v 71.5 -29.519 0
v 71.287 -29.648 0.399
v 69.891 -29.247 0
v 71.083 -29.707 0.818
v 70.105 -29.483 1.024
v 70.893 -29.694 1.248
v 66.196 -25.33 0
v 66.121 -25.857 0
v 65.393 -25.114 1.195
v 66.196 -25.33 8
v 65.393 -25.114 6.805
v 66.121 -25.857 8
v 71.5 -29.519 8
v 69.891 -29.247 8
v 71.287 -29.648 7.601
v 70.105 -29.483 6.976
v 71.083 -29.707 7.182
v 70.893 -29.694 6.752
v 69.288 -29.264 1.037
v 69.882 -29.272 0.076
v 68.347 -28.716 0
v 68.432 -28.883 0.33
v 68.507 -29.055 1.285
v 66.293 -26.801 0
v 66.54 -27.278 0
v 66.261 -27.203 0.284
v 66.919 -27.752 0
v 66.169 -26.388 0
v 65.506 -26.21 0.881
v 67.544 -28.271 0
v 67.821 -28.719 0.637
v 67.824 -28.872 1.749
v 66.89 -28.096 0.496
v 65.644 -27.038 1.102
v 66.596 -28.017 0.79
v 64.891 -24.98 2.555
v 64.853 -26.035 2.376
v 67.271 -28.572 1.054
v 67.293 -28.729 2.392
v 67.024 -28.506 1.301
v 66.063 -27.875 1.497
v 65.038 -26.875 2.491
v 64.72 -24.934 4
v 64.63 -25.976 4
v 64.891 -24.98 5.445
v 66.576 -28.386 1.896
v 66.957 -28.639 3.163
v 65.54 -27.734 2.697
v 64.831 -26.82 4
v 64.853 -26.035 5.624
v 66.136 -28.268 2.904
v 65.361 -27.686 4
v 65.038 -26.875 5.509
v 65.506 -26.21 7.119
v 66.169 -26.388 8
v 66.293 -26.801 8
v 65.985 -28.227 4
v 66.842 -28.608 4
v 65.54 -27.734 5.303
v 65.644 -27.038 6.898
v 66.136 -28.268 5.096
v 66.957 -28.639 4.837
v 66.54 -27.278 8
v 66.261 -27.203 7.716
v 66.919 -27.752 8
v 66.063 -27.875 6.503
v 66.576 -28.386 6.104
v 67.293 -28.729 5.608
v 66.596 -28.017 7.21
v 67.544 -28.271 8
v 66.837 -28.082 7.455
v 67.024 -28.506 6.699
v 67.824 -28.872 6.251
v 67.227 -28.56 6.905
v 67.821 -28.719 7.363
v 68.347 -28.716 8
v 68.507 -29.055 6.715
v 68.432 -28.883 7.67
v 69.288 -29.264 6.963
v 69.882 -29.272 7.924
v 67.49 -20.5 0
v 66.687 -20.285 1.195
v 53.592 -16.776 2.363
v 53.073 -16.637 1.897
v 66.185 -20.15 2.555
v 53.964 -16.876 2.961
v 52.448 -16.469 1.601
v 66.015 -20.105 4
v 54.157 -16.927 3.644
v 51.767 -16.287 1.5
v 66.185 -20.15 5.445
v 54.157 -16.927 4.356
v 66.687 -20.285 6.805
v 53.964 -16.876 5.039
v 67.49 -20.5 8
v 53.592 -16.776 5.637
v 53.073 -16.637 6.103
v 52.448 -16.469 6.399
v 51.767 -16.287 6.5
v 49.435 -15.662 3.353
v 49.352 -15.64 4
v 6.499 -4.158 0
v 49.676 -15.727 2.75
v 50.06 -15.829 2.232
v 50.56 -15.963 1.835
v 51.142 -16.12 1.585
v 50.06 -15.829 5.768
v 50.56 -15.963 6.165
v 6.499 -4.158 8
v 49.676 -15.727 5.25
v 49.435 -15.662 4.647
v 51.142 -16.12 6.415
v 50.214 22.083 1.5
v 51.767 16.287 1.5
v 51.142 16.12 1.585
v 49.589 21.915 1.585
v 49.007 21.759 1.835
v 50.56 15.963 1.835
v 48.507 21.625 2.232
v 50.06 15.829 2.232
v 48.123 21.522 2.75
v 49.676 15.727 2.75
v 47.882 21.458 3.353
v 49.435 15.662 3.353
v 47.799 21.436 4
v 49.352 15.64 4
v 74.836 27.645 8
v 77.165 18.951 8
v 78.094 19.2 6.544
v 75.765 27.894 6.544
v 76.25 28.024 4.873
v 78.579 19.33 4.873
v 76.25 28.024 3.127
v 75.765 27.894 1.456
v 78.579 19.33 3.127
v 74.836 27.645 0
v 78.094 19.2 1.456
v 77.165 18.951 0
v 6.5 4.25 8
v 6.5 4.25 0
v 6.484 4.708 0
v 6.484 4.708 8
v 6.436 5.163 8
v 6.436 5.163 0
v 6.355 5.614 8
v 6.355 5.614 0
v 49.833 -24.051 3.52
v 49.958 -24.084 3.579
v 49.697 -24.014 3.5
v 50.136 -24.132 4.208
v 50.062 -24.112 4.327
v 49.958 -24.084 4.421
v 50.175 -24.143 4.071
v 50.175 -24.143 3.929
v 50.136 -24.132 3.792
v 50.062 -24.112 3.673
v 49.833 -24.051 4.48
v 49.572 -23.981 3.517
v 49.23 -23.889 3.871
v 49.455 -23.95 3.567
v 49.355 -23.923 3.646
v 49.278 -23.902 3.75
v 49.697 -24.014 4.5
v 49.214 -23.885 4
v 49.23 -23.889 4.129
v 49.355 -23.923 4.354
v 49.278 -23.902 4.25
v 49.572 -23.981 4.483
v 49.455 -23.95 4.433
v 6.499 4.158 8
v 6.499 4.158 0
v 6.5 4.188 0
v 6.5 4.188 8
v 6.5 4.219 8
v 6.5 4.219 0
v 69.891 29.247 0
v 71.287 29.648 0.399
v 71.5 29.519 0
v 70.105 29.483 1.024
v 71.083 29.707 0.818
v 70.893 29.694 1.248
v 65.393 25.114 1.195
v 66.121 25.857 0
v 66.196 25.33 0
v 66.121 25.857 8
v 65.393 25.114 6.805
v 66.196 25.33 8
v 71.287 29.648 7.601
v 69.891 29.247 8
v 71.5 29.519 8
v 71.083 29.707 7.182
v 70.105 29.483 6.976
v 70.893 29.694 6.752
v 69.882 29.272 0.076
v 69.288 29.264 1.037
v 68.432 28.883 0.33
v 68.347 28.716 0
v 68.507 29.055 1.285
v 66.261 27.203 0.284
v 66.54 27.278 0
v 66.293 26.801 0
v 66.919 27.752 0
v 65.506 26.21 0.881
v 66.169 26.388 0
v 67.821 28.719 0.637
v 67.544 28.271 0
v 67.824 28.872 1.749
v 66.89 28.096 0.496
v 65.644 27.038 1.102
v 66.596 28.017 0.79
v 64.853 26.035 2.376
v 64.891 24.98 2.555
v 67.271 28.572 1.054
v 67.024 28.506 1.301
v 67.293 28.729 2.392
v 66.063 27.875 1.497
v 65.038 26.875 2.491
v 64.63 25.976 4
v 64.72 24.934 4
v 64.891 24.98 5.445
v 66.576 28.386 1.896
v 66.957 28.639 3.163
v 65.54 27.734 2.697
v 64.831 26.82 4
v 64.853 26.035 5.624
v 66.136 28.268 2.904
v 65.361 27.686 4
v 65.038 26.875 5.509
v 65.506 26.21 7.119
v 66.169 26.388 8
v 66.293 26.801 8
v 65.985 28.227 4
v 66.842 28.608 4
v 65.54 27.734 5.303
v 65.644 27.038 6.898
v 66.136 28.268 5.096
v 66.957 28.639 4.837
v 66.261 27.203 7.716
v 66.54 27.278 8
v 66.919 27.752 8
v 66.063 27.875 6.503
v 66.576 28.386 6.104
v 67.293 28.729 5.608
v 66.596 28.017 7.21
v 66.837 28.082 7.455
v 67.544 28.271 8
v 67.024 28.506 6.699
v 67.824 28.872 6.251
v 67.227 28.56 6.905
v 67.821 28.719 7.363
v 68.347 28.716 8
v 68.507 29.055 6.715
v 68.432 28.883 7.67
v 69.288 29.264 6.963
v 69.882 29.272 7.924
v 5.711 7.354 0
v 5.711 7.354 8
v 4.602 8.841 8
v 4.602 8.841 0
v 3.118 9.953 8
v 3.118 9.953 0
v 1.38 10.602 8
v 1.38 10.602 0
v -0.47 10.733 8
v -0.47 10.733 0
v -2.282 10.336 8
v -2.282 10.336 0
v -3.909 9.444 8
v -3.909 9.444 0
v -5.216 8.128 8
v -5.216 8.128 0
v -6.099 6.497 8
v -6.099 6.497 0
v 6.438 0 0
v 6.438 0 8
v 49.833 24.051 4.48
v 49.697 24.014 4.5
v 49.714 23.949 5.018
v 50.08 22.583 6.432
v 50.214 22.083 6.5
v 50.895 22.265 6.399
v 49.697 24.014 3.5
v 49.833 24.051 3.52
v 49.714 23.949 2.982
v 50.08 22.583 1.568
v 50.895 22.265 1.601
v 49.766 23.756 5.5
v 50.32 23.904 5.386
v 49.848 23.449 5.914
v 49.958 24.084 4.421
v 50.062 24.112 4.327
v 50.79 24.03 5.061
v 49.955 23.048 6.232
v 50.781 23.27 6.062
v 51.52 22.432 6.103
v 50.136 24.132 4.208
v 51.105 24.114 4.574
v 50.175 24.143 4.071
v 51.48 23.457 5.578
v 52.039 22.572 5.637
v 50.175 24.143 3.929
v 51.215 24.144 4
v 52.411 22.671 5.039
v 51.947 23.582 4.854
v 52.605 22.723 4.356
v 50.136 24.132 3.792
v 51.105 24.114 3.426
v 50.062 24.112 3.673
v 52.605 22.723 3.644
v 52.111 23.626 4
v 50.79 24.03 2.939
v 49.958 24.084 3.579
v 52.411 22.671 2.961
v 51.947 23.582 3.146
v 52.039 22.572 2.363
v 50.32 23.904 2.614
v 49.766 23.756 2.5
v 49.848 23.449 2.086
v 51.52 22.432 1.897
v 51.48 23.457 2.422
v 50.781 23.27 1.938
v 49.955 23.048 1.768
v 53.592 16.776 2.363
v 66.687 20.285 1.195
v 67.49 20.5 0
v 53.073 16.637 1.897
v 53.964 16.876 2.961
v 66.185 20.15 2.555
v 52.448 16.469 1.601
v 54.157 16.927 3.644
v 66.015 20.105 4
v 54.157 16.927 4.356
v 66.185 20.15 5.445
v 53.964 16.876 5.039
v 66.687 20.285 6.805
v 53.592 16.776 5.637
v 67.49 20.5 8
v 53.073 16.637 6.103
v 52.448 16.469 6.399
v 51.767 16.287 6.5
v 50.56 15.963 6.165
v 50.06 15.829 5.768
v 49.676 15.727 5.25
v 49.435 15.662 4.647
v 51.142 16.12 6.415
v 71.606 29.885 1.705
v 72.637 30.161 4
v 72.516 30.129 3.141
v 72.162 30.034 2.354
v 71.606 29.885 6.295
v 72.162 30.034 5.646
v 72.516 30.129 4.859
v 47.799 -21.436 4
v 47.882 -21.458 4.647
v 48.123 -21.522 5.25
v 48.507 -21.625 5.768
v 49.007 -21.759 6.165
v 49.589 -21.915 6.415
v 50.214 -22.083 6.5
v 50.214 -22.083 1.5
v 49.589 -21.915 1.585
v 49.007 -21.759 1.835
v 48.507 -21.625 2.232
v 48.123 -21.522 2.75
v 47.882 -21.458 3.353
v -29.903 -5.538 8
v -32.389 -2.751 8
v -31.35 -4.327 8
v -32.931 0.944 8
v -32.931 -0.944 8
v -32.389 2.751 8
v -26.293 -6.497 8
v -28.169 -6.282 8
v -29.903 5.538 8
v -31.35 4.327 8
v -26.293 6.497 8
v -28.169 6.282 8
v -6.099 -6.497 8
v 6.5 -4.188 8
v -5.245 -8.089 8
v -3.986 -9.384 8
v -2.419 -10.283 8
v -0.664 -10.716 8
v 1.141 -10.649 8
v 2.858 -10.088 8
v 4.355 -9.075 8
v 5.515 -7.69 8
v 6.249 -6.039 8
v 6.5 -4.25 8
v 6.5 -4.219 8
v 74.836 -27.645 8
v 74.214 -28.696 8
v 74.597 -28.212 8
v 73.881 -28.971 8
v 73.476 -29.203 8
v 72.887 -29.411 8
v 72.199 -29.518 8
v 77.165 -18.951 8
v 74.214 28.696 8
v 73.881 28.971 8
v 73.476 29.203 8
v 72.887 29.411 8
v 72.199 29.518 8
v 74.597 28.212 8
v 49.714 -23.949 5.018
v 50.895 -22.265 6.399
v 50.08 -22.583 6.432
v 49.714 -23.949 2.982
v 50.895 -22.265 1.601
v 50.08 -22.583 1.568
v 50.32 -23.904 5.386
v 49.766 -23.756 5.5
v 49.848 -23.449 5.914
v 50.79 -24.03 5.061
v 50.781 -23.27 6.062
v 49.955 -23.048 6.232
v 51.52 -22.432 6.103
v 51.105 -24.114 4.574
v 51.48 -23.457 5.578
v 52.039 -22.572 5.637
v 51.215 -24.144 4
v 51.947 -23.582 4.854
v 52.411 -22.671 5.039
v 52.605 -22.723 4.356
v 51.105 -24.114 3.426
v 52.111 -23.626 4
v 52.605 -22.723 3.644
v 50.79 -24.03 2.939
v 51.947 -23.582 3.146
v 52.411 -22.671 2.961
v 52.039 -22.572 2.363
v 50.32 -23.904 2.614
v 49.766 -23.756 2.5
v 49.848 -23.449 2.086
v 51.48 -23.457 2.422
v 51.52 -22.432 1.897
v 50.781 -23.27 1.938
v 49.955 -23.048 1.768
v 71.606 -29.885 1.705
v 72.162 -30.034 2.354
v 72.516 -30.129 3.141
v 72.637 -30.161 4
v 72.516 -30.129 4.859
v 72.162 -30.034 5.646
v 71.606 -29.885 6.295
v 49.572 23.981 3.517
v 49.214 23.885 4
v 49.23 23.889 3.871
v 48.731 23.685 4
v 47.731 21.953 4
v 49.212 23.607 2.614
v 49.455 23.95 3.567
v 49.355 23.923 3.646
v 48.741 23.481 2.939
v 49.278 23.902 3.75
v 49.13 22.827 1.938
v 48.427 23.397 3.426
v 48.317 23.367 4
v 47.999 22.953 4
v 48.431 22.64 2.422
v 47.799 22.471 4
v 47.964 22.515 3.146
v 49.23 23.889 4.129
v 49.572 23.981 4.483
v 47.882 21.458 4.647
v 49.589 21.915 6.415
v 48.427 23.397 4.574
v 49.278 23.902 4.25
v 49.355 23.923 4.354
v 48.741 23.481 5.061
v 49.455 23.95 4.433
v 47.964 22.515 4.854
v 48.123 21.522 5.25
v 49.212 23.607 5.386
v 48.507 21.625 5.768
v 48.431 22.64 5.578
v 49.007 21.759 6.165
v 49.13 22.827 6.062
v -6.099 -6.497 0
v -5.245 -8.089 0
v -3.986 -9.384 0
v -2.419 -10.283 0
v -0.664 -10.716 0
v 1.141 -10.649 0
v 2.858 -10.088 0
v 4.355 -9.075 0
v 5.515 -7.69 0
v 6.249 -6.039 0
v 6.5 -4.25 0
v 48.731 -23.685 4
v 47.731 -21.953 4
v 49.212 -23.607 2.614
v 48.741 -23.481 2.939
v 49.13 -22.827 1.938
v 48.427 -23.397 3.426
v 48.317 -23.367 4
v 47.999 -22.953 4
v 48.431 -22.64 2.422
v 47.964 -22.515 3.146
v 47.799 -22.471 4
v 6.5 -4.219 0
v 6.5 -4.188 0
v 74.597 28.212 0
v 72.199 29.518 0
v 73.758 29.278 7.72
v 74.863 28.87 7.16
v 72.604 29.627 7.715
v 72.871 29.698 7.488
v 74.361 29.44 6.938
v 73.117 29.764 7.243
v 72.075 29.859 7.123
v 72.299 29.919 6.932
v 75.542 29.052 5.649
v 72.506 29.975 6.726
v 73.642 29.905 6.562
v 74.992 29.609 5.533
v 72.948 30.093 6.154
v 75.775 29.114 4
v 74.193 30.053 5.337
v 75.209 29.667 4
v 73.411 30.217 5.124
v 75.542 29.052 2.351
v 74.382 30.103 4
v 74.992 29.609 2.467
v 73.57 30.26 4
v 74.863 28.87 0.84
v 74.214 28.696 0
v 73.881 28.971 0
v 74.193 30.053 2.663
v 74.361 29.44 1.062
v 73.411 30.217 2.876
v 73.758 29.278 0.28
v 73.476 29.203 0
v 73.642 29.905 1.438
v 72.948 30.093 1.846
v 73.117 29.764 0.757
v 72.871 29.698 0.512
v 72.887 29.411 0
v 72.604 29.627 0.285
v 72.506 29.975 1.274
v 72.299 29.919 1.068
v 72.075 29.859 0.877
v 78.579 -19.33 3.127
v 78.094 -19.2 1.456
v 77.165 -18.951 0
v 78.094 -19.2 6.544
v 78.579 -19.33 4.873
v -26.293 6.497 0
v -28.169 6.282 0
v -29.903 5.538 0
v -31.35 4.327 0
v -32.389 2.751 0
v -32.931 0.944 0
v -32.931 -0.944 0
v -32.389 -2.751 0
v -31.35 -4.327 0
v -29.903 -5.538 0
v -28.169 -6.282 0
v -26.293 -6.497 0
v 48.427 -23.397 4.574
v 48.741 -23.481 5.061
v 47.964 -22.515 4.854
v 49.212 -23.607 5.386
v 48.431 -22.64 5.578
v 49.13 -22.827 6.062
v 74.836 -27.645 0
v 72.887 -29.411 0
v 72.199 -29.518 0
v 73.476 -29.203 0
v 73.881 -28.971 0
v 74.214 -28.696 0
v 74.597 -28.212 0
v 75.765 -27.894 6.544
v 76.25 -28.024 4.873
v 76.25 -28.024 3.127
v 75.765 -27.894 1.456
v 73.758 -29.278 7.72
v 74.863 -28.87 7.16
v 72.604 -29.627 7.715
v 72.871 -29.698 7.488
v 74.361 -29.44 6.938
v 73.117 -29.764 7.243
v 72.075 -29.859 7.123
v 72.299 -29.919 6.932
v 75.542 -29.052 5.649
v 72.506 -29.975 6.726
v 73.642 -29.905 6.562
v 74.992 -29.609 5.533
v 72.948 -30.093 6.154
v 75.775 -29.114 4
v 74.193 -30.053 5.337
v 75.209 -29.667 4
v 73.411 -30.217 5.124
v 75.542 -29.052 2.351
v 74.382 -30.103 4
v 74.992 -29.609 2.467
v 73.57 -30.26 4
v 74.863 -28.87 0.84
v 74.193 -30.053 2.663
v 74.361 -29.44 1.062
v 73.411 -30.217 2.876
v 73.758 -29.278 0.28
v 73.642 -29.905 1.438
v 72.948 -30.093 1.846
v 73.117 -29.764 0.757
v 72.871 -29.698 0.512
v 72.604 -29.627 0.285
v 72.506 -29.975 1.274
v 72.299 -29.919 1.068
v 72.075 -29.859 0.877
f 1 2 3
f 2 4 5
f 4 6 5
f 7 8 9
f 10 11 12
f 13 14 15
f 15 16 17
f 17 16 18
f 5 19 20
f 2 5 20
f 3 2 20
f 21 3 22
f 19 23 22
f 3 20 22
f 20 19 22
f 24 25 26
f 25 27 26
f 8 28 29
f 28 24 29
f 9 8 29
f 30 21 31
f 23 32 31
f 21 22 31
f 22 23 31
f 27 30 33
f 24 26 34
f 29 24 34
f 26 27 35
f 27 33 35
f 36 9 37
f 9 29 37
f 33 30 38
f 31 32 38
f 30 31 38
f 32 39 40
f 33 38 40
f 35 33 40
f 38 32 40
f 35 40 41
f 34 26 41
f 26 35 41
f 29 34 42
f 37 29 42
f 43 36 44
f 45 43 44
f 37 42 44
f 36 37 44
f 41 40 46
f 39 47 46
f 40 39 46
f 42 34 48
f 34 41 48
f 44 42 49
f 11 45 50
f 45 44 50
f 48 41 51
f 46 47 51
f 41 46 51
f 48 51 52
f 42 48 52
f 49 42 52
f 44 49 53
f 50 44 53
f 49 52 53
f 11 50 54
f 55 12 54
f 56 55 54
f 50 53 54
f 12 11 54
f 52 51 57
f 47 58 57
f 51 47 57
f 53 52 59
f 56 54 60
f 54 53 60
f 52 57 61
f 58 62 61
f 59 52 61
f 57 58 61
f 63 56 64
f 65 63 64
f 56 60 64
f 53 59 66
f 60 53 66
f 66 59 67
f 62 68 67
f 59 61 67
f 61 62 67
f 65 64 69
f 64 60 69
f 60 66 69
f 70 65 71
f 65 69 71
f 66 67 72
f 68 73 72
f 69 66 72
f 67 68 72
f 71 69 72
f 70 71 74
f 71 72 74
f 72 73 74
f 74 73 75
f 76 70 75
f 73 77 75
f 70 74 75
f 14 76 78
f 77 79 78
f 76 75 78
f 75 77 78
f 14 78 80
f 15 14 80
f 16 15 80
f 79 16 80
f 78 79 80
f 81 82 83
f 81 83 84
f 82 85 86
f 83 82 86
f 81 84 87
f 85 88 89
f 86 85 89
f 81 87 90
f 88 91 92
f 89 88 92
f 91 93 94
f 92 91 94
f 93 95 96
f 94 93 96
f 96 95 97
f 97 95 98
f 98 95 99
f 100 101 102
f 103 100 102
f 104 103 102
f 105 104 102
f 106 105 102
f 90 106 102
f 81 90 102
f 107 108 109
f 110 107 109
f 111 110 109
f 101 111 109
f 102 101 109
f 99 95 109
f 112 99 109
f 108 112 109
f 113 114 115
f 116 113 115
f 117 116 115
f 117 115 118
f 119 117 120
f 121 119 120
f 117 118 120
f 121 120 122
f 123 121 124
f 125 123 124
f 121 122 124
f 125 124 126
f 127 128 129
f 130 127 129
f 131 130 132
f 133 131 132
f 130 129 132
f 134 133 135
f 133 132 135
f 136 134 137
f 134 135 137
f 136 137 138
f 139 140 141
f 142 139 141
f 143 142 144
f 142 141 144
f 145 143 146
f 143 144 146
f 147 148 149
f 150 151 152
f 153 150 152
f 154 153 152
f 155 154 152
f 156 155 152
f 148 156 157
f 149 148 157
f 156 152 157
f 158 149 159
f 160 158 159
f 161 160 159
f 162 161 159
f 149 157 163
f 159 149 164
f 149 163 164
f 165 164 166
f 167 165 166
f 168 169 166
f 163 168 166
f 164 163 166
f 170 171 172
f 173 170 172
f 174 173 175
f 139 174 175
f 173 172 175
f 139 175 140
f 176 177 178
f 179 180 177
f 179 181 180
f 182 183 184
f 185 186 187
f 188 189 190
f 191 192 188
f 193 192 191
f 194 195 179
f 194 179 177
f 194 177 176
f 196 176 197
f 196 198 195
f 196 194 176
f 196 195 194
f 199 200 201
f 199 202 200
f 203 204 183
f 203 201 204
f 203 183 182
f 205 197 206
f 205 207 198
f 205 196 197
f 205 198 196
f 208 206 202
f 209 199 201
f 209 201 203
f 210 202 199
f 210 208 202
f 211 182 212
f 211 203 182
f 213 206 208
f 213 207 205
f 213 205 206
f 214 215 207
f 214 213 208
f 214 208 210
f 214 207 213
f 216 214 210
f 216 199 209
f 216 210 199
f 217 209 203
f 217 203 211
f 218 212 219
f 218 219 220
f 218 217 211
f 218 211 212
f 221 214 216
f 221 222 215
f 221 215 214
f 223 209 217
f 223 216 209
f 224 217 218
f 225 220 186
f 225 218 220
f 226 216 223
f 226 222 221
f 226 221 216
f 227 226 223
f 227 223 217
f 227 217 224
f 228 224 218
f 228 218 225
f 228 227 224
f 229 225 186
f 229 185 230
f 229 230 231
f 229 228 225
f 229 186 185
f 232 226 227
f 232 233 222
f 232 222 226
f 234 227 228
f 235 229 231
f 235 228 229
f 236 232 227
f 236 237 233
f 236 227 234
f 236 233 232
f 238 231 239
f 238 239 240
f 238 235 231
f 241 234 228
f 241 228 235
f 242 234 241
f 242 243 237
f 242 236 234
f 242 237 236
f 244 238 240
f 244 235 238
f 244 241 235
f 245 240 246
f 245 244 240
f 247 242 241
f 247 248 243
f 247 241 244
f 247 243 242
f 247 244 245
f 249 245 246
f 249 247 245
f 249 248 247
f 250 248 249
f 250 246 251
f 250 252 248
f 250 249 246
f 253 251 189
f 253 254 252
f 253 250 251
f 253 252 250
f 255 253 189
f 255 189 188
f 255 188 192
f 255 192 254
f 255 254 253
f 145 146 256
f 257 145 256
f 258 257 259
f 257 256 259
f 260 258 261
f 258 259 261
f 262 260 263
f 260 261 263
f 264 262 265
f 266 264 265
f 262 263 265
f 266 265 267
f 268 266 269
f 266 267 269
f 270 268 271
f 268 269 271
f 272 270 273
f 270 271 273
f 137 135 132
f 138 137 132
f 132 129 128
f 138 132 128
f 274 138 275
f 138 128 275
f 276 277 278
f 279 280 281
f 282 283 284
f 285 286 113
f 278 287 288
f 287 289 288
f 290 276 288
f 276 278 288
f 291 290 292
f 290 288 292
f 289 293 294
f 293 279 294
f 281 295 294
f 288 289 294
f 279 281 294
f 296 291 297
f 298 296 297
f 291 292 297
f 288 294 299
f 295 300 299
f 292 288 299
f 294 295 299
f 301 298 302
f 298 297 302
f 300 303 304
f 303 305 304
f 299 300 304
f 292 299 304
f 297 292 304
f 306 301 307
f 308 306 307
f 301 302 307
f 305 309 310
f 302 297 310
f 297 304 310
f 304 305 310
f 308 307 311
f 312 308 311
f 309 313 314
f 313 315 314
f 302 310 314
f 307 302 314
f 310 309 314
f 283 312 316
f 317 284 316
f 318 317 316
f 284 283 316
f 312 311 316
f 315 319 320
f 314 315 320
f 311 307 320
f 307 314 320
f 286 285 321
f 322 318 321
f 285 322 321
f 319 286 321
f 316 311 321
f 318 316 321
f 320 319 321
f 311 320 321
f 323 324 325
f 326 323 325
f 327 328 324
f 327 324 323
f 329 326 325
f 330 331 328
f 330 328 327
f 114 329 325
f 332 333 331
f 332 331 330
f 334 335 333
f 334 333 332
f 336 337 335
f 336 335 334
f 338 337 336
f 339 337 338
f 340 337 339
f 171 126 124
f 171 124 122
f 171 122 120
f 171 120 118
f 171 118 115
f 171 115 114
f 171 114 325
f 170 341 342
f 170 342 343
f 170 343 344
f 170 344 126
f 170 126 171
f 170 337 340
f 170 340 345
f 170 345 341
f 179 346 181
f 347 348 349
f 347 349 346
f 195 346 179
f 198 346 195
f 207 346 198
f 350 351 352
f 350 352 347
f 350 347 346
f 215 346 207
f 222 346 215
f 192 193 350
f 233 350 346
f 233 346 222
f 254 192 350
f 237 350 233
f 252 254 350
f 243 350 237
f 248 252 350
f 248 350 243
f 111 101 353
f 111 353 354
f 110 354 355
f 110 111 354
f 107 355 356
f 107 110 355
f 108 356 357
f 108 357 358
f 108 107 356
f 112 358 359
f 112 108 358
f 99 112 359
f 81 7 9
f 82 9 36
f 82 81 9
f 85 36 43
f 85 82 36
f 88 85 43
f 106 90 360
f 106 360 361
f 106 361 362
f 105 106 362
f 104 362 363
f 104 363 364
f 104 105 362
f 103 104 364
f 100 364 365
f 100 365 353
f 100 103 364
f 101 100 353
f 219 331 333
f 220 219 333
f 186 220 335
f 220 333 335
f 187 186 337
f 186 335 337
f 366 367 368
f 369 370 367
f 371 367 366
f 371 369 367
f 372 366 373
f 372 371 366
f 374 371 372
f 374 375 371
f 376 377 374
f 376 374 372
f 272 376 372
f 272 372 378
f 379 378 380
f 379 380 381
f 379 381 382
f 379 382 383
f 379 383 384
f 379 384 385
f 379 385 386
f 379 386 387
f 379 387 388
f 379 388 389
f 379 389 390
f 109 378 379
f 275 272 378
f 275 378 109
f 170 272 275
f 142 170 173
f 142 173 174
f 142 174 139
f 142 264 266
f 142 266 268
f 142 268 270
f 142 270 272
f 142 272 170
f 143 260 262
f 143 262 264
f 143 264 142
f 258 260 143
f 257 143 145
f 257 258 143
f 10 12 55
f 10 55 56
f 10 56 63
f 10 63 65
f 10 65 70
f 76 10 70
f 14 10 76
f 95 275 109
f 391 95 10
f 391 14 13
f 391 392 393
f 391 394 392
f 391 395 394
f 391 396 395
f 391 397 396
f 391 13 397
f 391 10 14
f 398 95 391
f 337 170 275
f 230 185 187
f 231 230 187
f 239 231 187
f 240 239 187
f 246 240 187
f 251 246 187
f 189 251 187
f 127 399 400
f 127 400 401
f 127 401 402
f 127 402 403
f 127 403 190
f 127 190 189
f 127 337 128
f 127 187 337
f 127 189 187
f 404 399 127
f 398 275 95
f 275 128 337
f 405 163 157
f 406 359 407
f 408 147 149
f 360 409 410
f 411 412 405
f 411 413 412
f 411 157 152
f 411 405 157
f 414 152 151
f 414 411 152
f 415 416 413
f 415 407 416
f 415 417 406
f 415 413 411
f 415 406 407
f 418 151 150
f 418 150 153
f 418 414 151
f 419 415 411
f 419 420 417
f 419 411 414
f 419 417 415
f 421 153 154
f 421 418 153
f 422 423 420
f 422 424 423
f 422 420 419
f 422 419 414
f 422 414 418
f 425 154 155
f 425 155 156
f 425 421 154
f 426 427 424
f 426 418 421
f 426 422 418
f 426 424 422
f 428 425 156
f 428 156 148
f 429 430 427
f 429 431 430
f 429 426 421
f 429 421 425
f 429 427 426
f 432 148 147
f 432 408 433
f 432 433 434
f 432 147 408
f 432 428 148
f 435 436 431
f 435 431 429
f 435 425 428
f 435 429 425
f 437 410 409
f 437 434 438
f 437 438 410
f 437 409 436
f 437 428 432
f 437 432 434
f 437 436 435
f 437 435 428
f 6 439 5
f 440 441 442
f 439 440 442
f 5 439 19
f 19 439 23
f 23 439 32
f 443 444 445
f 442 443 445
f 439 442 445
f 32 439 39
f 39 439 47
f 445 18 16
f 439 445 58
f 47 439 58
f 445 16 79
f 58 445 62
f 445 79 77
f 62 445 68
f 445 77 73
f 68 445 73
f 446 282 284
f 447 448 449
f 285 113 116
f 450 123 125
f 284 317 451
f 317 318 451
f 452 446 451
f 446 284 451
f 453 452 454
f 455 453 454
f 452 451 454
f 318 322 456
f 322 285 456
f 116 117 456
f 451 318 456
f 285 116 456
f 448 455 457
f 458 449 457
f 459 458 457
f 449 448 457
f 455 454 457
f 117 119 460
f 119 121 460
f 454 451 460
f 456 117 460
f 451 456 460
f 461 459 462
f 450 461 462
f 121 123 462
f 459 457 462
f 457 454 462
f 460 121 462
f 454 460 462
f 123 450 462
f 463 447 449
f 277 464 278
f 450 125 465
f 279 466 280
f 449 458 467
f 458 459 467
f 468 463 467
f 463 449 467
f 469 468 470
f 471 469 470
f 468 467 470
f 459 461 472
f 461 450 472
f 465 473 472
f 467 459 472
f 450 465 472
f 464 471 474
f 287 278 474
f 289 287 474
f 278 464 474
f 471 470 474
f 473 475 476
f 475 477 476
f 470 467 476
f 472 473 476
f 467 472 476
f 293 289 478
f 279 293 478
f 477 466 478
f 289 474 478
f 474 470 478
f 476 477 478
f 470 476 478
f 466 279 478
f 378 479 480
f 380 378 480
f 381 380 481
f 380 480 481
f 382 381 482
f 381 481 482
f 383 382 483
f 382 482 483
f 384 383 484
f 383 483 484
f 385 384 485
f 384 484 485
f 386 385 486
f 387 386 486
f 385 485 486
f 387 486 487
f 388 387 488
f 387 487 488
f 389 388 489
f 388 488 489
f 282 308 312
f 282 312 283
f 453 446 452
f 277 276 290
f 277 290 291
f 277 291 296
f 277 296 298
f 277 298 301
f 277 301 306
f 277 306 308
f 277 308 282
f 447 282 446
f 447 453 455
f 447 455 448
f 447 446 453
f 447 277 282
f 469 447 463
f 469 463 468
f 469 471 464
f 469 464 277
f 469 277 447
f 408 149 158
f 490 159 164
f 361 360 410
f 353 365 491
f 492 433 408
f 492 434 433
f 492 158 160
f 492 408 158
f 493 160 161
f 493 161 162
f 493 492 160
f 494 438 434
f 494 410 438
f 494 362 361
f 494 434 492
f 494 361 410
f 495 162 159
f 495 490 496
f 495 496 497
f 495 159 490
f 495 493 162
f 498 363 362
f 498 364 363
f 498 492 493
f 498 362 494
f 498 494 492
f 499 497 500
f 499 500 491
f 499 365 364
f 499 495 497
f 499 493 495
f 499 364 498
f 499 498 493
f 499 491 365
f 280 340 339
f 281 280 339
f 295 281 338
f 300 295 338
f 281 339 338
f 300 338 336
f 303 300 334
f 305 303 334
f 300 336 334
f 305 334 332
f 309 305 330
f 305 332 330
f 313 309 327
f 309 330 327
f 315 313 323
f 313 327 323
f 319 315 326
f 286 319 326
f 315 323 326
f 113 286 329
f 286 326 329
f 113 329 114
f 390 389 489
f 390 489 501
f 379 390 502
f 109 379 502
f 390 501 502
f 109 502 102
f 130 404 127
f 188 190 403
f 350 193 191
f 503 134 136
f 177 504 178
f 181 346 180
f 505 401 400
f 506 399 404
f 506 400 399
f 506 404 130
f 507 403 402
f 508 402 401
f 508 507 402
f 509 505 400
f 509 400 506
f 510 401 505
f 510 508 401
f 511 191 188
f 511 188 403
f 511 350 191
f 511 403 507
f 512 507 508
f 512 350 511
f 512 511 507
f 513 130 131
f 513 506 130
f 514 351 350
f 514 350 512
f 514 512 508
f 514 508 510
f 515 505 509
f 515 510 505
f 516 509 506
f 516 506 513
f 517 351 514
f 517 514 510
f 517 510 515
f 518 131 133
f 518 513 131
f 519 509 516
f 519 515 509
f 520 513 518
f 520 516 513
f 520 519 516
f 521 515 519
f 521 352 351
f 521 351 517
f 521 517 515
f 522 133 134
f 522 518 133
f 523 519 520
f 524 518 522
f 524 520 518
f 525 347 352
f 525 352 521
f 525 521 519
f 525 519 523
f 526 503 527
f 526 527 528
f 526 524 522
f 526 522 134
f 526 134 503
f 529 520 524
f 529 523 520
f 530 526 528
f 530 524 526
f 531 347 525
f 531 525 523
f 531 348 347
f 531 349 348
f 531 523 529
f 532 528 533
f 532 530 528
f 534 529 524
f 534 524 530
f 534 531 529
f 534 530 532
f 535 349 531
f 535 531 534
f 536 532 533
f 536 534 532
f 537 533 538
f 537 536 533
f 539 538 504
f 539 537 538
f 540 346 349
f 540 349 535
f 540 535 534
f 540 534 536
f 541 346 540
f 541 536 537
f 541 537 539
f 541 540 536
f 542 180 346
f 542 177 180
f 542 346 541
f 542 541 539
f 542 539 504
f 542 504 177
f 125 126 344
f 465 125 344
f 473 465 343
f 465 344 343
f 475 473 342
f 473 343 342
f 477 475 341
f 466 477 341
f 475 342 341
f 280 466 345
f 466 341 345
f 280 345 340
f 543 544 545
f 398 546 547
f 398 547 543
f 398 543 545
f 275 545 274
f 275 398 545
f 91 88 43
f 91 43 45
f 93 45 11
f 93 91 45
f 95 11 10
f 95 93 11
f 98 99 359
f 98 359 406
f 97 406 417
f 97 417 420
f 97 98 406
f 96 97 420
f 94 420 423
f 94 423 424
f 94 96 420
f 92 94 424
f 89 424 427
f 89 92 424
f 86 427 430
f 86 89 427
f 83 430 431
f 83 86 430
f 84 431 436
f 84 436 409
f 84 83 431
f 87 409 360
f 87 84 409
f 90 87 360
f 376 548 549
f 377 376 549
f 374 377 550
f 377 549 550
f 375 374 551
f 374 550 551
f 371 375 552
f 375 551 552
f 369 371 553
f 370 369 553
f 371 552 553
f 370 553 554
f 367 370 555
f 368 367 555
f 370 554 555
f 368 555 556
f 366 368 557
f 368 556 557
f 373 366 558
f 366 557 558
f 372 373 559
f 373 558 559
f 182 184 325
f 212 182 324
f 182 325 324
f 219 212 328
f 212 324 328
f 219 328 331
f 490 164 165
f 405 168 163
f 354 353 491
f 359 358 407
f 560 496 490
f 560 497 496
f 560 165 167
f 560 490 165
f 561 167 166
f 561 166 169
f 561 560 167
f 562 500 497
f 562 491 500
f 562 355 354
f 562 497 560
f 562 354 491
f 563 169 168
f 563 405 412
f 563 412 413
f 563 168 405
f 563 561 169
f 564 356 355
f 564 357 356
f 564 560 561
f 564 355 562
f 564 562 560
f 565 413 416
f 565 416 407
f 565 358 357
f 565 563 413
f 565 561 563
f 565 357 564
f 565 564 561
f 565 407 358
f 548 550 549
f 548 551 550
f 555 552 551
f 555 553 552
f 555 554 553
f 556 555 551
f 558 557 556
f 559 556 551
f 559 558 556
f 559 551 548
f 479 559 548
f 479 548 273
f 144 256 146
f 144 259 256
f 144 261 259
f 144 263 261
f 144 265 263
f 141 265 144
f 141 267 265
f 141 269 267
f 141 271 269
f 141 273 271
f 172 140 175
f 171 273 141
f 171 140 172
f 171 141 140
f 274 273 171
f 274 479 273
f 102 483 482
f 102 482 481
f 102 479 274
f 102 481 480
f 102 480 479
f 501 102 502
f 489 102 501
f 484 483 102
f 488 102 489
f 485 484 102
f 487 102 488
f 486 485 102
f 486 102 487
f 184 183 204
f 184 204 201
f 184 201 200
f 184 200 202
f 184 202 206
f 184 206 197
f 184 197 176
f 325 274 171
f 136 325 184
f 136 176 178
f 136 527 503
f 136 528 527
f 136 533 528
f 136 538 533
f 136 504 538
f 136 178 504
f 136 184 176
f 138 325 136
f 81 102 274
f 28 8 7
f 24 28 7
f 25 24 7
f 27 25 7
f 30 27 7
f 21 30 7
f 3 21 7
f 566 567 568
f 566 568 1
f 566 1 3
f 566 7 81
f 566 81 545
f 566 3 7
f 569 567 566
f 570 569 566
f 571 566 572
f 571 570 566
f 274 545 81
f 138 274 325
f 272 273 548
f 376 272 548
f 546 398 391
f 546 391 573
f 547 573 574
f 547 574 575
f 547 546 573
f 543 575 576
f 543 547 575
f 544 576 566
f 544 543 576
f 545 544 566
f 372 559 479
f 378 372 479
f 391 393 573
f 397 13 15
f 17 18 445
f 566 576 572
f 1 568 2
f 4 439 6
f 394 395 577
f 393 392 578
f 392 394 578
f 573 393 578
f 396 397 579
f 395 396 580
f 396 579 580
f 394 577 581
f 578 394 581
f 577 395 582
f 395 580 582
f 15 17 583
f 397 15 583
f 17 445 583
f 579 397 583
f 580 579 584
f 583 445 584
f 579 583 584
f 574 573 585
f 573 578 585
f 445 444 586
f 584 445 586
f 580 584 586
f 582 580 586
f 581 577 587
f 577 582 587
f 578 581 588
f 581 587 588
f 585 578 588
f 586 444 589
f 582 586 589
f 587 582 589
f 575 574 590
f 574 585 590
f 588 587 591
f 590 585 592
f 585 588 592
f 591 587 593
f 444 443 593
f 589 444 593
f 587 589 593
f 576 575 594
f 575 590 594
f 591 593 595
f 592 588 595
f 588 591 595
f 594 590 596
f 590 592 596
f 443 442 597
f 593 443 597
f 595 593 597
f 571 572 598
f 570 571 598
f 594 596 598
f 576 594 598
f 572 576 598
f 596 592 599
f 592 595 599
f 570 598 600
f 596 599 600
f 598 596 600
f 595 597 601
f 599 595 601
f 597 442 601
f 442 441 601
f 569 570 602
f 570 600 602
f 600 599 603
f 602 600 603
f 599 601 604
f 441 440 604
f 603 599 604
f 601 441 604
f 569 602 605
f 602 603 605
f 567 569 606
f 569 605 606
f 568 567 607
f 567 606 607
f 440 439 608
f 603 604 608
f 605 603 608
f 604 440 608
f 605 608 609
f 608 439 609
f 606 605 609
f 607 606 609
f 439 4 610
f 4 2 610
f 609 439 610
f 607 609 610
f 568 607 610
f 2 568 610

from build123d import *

# Parameters (mm, degrees)
F1_DEPTH    = 8
F4_DEPTH    = 12
F5_DEPTH    = 12
F6_DEPTH    = 4
F7_T2_ANGLE = 226.9097490639
F7_T4_ANGLE = 226.9097490639
F8_R        = 2


# Not quite as in the source:
# - a fillet or chamfer that OpenCascade refuses, or shapes differently, is made with other operations: its cross-section is extruded or revolved along the edge and cut away or added
# - a feature names something its author has since deleted; it is built from what else it names


with BuildPart() as f1:
    # F0 (on Top) → F1 (new body)
    with BuildSketch(Plane.XY):
        with BuildLine():
            ThreePointArc((-26.2934756426, -6.4967182246), (-21.8313594954, -4.5225872947), (-20, 0))
            ThreePointArc((-20, 0), (-21.8313594954, 4.5225872947), (-26.2934756426, 6.4967182246))
            ThreePointArc((-26.2934756426, 6.4967182246), (-33, 0), (-26.2934756426, -6.4967182246))
        make_face()
        with BuildLine():
            ThreePointArc((4.9180788932, 0), (0, 2.25), (-4.9180788932, 0))
            ThreePointArc((-4.9180788932, 0), (0, -2.25), (4.9180788932, 0))
        make_face()
        with BuildLine():
            Line((6.4380174247, 0), (6.3926786471, 3.0737093407))
            ThreePointArc((6.3926786471, 3.0737093407), (5.8604804677, 1.4384579519), (4.9180788932, 0))
            ThreePointArc((4.9180788932, 0), (6.0748085227, -1.9377064606), (6.4992929884, -4.1541321195))
            Line((6.4992929884, -4.1541321195), (6.4380174247, 0))
        make_face()
        with BuildLine():
            ThreePointArc((-26.2934756426, 6.4967182246), (-21.8313594954, 4.5225872947), (-20, 0))
            ThreePointArc((-20, 0), (-21.8313594954, -4.5225872947), (-26.2934756426, -6.4967182246))
            Line((-26.2934756426, -6.4967182246), (-6.0993653128, -6.4967182246))
            ThreePointArc((-6.0993653128, -6.4967182246), (-6.3951431673, -3.0871827877), (-4.9180788932, 0))
            ThreePointArc((-4.9180788932, 0), (-6.3951431673, 3.0871827877), (-6.0993653128, 6.4967182246))
            Line((-6.0993653128, 6.4967182246), (-26.2934756426, 6.4967182246))
        make_face()
        with BuildLine():
            ThreePointArc((-4.9180788932, 0), (-6.3951431673, -3.0871827877), (-6.0993653128, -6.4967182246))
            ThreePointArc((-6.0993653128, -6.4967182246), (1.141079635, -10.6490575296), (6.5, -4.25))
            ThreePointArc((6.5, -4.25), (6.4998232447, -4.2020647563), (6.4992929884, -4.1541321195))
            ThreePointArc((6.4992929884, -4.1541321195), (6.0748085227, -1.9377064606), (4.9180788932, 0))
            ThreePointArc((4.9180788932, 0), (0, -2.25), (-4.9180788932, 0))
        make_face()
        with BuildLine():
            ThreePointArc((6.3552032224, 5.614328407), (0.4593650036, 10.7337476658), (-6.0993653128, 6.4967182246))
            ThreePointArc((-6.0993653128, 6.4967182246), (-6.3951431673, 3.0871827877), (-4.9180788932, 0))
            ThreePointArc((-4.9180788932, 0), (0, 2.25), (4.9180788932, 0))
            ThreePointArc((4.9180788932, 0), (5.8604804677, 1.4384579519), (6.3926786471, 3.0737093407))
            Line((6.3926786471, 3.0737093407), (6.3552032224, 5.614328407))
        make_face()
        with BuildLine():
            ThreePointArc((6.5, 4.25), (6.4636994417, 4.9359952822), (6.3552032224, 5.614328407))
            Line((6.3552032224, 5.614328407), (6.3926786471, 3.0737093407))
            ThreePointArc((6.3926786471, 3.0737093407), (6.4731140576, 3.6594118212), (6.5, 4.25))
        make_face()
    extrude(amount=F1_DEPTH)



with BuildPart() as f4:
    # F3 (on line) → F4 (new body)
    with BuildSketch(Plane(origin=(0.4312653925, -1.6095043562, 0), x_dir=(-0.9659258263, -0.2588190451, 0), z_dir=(-0.2588190451, 0.9659258263, 0))):
        with BuildLine():
            Line((-79.4407832557, 0), (-74.9686473007, 0))
            Line((-74.9686473007, 0), (-74.9686473007, 8))
            Line((-74.9686473007, 8), (-79.4407832557, 8))
            ThreePointArc((-79.4407832557, 8), (-80.9686473007, 4), (-79.4407832557, 0))
        make_face()
        with BuildLine():
            Line((-74.9686473007, 8), (-74.9686473007, 0))
            Line((-74.9686473007, 0), (-70.4965113457, 0))
            ThreePointArc((-70.4965113457, 0), (-69.3636131469, 1.8590674614), (-68.9686473007, 4))
            ThreePointArc((-68.9686473007, 4), (-69.3636131469, 6.1409325386), (-70.4965113457, 8))
            Line((-70.4965113457, 8), (-74.9686473007, 8))
        make_face()
    extrude(amount=F4_DEPTH)


with BuildPart() as f5:
    # F3 (on line) → F5 (new body)
    with BuildSketch(Plane(origin=(0.4312653925, -1.6095043562, 0), x_dir=(-0.9659258263, -0.2588190451, 0), z_dir=(-0.2588190451, 0.9659258263, 0))):
        with BuildLine():
            ThreePointArc((-54.2186473007, 6.5), (-56.7186473007, 4), (-54.2186473007, 1.5))
            Line((-54.2186473007, 1.5), (-54.2186473007, 4))
            Line((-54.2186473007, 4), (-54.2186473007, 6.5))
        make_face()
        with BuildLine():
            ThreePointArc((-51.7186473007, 4), (-52.4508803477, 5.767766953), (-54.2186473007, 6.5))
            Line((-54.2186473007, 6.5), (-54.2186473007, 4))
            Line((-54.2186473007, 4), (-51.7186473007, 4))
        make_face()
        with BuildLine():
            Line((-54.2186473007, 4), (-54.2186473007, 1.5))
            ThreePointArc((-54.2186473007, 1.5), (-52.4508803477, 2.232233047), (-51.7186473007, 4))
            Line((-51.7186473007, 4), (-54.2186473007, 4))
        make_face()
    extrude(amount=F5_DEPTH)


with BuildPart() as f1_1:
    add(f1.part)

    add(f4.part)  # F6 merges F4

    add(f5.part)  # F6 merges F5
    # F3 (on line) → F6 (join)
    with BuildSketch(Plane(origin=(0.4312653925, -1.6095043562, 0), x_dir=(-0.9659258263, -0.2588190451, 0), z_dir=(-0.2588190451, 0.9659258263, 0))):
        with BuildLine():
            Line((-54.2186473007, 1.5), (-54.2186473007, 0))
            Line((-54.2186473007, 0), (-6.2186473007, 0))
            Line((-6.2186473007, 0), (-6.2186473007, 4))
            Line((-6.2186473007, 4), (-51.7186473007, 4))
            ThreePointArc((-51.7186473007, 4), (-52.4508803477, 2.232233047), (-54.2186473007, 1.5))
        make_face()
        with BuildLine():
            Line((-6.2186473007, 8), (-54.2186473007, 8))
            Line((-54.2186473007, 8), (-54.2186473007, 6.5))
            ThreePointArc((-54.2186473007, 6.5), (-52.4508803477, 5.767766953), (-51.7186473007, 4))
            Line((-51.7186473007, 4), (-6.2186473007, 4))
            Line((-6.2186473007, 4), (-6.2186473007, 8))
        make_face()
        with BuildLine():
            ThreePointArc((-68.9686473007, 4), (-69.3636131469, 1.8590674614), (-70.4965113457, 0))
            Line((-70.4965113457, 0), (-54.2186473007, 0))
            Line((-54.2186473007, 0), (-54.2186473007, 1.5))
            ThreePointArc((-54.2186473007, 1.5), (-56.7186473007, 4), (-54.2186473007, 6.5))
            Line((-54.2186473007, 6.5), (-54.2186473007, 8))
            Line((-54.2186473007, 8), (-70.4965113457, 8))
            ThreePointArc((-70.4965113457, 8), (-69.3636131469, 6.1409325386), (-68.9686473007, 4))
        make_face()
    extrude(amount=F6_DEPTH)

    # F7: fillet of radius 3 on 2 edges, made by hand

    # F7_s1 → F7_t2 (revolve, cut)
    with BuildSketch(Plane(origin=(62.3527130216, 16.7073591, 28.0076976241), x_dir=(-0.2588190451, 0.9659258263, 0), z_dir=(0.8861150843, 0.2374338212, 0.3980266798))):
        with BuildLine():
            ThreePointArc((7.3337184778, -32.1700264164), (9.4550388213, -31.2913467599), (10.3337184778, -29.1700264164))
            Line((10.3337184778, -29.1700264164), (10.3337184778, -32.1700264164))
            Line((10.3337184778, -32.1700264164), (7.3337184778, -32.1700264164))
        make_face()
    revolve(axis=Axis((69.7395894409, 29.3849192663, 4), (-0.2588190451, 0.9659258263, 0)), revolution_arc=F7_T2_ANGLE, mode=Mode.SUBTRACT)

    # F7_s3 → F7_t4 (revolve, cut)
    with BuildSketch(Plane(origin=(62.3527130216, 16.7073591, 28.0076976241), x_dir=(0.2588190451, -0.9659258263, 0), z_dir=(-0.8861150843, -0.2374338212, -0.3980266798))):
        with BuildLine():
            ThreePointArc((-7.3337184778, -20.1700264164), (-9.4550388213, -21.0487060728), (-10.3337184778, -23.1700264164))
            Line((-10.3337184778, -23.1700264164), (-10.3337184778, -20.1700264164))
            Line((-10.3337184778, -20.1700264164), (-7.3337184778, -20.1700264164))
        make_face()
    revolve(axis=Axis((69.7395894409, 29.3849192663, 4), (-0.2588190451, 0.9659258263, 0)), revolution_arc=F7_T4_ANGLE, mode=Mode.SUBTRACT)

    # F8
    f8_edges = [f1_1.edges().sort_by_distance(p)[0] for p in [
        (49.696629, 24.014424, 6.5),
    ]]
    fillet(f8_edges, radius=F8_R)

    # F9: F1 across plane


with BuildPart() as f1_2:
    add(f1_1.part)
    add(f1_1.part.mirror(Plane.XZ))


solid = f1_2.part
